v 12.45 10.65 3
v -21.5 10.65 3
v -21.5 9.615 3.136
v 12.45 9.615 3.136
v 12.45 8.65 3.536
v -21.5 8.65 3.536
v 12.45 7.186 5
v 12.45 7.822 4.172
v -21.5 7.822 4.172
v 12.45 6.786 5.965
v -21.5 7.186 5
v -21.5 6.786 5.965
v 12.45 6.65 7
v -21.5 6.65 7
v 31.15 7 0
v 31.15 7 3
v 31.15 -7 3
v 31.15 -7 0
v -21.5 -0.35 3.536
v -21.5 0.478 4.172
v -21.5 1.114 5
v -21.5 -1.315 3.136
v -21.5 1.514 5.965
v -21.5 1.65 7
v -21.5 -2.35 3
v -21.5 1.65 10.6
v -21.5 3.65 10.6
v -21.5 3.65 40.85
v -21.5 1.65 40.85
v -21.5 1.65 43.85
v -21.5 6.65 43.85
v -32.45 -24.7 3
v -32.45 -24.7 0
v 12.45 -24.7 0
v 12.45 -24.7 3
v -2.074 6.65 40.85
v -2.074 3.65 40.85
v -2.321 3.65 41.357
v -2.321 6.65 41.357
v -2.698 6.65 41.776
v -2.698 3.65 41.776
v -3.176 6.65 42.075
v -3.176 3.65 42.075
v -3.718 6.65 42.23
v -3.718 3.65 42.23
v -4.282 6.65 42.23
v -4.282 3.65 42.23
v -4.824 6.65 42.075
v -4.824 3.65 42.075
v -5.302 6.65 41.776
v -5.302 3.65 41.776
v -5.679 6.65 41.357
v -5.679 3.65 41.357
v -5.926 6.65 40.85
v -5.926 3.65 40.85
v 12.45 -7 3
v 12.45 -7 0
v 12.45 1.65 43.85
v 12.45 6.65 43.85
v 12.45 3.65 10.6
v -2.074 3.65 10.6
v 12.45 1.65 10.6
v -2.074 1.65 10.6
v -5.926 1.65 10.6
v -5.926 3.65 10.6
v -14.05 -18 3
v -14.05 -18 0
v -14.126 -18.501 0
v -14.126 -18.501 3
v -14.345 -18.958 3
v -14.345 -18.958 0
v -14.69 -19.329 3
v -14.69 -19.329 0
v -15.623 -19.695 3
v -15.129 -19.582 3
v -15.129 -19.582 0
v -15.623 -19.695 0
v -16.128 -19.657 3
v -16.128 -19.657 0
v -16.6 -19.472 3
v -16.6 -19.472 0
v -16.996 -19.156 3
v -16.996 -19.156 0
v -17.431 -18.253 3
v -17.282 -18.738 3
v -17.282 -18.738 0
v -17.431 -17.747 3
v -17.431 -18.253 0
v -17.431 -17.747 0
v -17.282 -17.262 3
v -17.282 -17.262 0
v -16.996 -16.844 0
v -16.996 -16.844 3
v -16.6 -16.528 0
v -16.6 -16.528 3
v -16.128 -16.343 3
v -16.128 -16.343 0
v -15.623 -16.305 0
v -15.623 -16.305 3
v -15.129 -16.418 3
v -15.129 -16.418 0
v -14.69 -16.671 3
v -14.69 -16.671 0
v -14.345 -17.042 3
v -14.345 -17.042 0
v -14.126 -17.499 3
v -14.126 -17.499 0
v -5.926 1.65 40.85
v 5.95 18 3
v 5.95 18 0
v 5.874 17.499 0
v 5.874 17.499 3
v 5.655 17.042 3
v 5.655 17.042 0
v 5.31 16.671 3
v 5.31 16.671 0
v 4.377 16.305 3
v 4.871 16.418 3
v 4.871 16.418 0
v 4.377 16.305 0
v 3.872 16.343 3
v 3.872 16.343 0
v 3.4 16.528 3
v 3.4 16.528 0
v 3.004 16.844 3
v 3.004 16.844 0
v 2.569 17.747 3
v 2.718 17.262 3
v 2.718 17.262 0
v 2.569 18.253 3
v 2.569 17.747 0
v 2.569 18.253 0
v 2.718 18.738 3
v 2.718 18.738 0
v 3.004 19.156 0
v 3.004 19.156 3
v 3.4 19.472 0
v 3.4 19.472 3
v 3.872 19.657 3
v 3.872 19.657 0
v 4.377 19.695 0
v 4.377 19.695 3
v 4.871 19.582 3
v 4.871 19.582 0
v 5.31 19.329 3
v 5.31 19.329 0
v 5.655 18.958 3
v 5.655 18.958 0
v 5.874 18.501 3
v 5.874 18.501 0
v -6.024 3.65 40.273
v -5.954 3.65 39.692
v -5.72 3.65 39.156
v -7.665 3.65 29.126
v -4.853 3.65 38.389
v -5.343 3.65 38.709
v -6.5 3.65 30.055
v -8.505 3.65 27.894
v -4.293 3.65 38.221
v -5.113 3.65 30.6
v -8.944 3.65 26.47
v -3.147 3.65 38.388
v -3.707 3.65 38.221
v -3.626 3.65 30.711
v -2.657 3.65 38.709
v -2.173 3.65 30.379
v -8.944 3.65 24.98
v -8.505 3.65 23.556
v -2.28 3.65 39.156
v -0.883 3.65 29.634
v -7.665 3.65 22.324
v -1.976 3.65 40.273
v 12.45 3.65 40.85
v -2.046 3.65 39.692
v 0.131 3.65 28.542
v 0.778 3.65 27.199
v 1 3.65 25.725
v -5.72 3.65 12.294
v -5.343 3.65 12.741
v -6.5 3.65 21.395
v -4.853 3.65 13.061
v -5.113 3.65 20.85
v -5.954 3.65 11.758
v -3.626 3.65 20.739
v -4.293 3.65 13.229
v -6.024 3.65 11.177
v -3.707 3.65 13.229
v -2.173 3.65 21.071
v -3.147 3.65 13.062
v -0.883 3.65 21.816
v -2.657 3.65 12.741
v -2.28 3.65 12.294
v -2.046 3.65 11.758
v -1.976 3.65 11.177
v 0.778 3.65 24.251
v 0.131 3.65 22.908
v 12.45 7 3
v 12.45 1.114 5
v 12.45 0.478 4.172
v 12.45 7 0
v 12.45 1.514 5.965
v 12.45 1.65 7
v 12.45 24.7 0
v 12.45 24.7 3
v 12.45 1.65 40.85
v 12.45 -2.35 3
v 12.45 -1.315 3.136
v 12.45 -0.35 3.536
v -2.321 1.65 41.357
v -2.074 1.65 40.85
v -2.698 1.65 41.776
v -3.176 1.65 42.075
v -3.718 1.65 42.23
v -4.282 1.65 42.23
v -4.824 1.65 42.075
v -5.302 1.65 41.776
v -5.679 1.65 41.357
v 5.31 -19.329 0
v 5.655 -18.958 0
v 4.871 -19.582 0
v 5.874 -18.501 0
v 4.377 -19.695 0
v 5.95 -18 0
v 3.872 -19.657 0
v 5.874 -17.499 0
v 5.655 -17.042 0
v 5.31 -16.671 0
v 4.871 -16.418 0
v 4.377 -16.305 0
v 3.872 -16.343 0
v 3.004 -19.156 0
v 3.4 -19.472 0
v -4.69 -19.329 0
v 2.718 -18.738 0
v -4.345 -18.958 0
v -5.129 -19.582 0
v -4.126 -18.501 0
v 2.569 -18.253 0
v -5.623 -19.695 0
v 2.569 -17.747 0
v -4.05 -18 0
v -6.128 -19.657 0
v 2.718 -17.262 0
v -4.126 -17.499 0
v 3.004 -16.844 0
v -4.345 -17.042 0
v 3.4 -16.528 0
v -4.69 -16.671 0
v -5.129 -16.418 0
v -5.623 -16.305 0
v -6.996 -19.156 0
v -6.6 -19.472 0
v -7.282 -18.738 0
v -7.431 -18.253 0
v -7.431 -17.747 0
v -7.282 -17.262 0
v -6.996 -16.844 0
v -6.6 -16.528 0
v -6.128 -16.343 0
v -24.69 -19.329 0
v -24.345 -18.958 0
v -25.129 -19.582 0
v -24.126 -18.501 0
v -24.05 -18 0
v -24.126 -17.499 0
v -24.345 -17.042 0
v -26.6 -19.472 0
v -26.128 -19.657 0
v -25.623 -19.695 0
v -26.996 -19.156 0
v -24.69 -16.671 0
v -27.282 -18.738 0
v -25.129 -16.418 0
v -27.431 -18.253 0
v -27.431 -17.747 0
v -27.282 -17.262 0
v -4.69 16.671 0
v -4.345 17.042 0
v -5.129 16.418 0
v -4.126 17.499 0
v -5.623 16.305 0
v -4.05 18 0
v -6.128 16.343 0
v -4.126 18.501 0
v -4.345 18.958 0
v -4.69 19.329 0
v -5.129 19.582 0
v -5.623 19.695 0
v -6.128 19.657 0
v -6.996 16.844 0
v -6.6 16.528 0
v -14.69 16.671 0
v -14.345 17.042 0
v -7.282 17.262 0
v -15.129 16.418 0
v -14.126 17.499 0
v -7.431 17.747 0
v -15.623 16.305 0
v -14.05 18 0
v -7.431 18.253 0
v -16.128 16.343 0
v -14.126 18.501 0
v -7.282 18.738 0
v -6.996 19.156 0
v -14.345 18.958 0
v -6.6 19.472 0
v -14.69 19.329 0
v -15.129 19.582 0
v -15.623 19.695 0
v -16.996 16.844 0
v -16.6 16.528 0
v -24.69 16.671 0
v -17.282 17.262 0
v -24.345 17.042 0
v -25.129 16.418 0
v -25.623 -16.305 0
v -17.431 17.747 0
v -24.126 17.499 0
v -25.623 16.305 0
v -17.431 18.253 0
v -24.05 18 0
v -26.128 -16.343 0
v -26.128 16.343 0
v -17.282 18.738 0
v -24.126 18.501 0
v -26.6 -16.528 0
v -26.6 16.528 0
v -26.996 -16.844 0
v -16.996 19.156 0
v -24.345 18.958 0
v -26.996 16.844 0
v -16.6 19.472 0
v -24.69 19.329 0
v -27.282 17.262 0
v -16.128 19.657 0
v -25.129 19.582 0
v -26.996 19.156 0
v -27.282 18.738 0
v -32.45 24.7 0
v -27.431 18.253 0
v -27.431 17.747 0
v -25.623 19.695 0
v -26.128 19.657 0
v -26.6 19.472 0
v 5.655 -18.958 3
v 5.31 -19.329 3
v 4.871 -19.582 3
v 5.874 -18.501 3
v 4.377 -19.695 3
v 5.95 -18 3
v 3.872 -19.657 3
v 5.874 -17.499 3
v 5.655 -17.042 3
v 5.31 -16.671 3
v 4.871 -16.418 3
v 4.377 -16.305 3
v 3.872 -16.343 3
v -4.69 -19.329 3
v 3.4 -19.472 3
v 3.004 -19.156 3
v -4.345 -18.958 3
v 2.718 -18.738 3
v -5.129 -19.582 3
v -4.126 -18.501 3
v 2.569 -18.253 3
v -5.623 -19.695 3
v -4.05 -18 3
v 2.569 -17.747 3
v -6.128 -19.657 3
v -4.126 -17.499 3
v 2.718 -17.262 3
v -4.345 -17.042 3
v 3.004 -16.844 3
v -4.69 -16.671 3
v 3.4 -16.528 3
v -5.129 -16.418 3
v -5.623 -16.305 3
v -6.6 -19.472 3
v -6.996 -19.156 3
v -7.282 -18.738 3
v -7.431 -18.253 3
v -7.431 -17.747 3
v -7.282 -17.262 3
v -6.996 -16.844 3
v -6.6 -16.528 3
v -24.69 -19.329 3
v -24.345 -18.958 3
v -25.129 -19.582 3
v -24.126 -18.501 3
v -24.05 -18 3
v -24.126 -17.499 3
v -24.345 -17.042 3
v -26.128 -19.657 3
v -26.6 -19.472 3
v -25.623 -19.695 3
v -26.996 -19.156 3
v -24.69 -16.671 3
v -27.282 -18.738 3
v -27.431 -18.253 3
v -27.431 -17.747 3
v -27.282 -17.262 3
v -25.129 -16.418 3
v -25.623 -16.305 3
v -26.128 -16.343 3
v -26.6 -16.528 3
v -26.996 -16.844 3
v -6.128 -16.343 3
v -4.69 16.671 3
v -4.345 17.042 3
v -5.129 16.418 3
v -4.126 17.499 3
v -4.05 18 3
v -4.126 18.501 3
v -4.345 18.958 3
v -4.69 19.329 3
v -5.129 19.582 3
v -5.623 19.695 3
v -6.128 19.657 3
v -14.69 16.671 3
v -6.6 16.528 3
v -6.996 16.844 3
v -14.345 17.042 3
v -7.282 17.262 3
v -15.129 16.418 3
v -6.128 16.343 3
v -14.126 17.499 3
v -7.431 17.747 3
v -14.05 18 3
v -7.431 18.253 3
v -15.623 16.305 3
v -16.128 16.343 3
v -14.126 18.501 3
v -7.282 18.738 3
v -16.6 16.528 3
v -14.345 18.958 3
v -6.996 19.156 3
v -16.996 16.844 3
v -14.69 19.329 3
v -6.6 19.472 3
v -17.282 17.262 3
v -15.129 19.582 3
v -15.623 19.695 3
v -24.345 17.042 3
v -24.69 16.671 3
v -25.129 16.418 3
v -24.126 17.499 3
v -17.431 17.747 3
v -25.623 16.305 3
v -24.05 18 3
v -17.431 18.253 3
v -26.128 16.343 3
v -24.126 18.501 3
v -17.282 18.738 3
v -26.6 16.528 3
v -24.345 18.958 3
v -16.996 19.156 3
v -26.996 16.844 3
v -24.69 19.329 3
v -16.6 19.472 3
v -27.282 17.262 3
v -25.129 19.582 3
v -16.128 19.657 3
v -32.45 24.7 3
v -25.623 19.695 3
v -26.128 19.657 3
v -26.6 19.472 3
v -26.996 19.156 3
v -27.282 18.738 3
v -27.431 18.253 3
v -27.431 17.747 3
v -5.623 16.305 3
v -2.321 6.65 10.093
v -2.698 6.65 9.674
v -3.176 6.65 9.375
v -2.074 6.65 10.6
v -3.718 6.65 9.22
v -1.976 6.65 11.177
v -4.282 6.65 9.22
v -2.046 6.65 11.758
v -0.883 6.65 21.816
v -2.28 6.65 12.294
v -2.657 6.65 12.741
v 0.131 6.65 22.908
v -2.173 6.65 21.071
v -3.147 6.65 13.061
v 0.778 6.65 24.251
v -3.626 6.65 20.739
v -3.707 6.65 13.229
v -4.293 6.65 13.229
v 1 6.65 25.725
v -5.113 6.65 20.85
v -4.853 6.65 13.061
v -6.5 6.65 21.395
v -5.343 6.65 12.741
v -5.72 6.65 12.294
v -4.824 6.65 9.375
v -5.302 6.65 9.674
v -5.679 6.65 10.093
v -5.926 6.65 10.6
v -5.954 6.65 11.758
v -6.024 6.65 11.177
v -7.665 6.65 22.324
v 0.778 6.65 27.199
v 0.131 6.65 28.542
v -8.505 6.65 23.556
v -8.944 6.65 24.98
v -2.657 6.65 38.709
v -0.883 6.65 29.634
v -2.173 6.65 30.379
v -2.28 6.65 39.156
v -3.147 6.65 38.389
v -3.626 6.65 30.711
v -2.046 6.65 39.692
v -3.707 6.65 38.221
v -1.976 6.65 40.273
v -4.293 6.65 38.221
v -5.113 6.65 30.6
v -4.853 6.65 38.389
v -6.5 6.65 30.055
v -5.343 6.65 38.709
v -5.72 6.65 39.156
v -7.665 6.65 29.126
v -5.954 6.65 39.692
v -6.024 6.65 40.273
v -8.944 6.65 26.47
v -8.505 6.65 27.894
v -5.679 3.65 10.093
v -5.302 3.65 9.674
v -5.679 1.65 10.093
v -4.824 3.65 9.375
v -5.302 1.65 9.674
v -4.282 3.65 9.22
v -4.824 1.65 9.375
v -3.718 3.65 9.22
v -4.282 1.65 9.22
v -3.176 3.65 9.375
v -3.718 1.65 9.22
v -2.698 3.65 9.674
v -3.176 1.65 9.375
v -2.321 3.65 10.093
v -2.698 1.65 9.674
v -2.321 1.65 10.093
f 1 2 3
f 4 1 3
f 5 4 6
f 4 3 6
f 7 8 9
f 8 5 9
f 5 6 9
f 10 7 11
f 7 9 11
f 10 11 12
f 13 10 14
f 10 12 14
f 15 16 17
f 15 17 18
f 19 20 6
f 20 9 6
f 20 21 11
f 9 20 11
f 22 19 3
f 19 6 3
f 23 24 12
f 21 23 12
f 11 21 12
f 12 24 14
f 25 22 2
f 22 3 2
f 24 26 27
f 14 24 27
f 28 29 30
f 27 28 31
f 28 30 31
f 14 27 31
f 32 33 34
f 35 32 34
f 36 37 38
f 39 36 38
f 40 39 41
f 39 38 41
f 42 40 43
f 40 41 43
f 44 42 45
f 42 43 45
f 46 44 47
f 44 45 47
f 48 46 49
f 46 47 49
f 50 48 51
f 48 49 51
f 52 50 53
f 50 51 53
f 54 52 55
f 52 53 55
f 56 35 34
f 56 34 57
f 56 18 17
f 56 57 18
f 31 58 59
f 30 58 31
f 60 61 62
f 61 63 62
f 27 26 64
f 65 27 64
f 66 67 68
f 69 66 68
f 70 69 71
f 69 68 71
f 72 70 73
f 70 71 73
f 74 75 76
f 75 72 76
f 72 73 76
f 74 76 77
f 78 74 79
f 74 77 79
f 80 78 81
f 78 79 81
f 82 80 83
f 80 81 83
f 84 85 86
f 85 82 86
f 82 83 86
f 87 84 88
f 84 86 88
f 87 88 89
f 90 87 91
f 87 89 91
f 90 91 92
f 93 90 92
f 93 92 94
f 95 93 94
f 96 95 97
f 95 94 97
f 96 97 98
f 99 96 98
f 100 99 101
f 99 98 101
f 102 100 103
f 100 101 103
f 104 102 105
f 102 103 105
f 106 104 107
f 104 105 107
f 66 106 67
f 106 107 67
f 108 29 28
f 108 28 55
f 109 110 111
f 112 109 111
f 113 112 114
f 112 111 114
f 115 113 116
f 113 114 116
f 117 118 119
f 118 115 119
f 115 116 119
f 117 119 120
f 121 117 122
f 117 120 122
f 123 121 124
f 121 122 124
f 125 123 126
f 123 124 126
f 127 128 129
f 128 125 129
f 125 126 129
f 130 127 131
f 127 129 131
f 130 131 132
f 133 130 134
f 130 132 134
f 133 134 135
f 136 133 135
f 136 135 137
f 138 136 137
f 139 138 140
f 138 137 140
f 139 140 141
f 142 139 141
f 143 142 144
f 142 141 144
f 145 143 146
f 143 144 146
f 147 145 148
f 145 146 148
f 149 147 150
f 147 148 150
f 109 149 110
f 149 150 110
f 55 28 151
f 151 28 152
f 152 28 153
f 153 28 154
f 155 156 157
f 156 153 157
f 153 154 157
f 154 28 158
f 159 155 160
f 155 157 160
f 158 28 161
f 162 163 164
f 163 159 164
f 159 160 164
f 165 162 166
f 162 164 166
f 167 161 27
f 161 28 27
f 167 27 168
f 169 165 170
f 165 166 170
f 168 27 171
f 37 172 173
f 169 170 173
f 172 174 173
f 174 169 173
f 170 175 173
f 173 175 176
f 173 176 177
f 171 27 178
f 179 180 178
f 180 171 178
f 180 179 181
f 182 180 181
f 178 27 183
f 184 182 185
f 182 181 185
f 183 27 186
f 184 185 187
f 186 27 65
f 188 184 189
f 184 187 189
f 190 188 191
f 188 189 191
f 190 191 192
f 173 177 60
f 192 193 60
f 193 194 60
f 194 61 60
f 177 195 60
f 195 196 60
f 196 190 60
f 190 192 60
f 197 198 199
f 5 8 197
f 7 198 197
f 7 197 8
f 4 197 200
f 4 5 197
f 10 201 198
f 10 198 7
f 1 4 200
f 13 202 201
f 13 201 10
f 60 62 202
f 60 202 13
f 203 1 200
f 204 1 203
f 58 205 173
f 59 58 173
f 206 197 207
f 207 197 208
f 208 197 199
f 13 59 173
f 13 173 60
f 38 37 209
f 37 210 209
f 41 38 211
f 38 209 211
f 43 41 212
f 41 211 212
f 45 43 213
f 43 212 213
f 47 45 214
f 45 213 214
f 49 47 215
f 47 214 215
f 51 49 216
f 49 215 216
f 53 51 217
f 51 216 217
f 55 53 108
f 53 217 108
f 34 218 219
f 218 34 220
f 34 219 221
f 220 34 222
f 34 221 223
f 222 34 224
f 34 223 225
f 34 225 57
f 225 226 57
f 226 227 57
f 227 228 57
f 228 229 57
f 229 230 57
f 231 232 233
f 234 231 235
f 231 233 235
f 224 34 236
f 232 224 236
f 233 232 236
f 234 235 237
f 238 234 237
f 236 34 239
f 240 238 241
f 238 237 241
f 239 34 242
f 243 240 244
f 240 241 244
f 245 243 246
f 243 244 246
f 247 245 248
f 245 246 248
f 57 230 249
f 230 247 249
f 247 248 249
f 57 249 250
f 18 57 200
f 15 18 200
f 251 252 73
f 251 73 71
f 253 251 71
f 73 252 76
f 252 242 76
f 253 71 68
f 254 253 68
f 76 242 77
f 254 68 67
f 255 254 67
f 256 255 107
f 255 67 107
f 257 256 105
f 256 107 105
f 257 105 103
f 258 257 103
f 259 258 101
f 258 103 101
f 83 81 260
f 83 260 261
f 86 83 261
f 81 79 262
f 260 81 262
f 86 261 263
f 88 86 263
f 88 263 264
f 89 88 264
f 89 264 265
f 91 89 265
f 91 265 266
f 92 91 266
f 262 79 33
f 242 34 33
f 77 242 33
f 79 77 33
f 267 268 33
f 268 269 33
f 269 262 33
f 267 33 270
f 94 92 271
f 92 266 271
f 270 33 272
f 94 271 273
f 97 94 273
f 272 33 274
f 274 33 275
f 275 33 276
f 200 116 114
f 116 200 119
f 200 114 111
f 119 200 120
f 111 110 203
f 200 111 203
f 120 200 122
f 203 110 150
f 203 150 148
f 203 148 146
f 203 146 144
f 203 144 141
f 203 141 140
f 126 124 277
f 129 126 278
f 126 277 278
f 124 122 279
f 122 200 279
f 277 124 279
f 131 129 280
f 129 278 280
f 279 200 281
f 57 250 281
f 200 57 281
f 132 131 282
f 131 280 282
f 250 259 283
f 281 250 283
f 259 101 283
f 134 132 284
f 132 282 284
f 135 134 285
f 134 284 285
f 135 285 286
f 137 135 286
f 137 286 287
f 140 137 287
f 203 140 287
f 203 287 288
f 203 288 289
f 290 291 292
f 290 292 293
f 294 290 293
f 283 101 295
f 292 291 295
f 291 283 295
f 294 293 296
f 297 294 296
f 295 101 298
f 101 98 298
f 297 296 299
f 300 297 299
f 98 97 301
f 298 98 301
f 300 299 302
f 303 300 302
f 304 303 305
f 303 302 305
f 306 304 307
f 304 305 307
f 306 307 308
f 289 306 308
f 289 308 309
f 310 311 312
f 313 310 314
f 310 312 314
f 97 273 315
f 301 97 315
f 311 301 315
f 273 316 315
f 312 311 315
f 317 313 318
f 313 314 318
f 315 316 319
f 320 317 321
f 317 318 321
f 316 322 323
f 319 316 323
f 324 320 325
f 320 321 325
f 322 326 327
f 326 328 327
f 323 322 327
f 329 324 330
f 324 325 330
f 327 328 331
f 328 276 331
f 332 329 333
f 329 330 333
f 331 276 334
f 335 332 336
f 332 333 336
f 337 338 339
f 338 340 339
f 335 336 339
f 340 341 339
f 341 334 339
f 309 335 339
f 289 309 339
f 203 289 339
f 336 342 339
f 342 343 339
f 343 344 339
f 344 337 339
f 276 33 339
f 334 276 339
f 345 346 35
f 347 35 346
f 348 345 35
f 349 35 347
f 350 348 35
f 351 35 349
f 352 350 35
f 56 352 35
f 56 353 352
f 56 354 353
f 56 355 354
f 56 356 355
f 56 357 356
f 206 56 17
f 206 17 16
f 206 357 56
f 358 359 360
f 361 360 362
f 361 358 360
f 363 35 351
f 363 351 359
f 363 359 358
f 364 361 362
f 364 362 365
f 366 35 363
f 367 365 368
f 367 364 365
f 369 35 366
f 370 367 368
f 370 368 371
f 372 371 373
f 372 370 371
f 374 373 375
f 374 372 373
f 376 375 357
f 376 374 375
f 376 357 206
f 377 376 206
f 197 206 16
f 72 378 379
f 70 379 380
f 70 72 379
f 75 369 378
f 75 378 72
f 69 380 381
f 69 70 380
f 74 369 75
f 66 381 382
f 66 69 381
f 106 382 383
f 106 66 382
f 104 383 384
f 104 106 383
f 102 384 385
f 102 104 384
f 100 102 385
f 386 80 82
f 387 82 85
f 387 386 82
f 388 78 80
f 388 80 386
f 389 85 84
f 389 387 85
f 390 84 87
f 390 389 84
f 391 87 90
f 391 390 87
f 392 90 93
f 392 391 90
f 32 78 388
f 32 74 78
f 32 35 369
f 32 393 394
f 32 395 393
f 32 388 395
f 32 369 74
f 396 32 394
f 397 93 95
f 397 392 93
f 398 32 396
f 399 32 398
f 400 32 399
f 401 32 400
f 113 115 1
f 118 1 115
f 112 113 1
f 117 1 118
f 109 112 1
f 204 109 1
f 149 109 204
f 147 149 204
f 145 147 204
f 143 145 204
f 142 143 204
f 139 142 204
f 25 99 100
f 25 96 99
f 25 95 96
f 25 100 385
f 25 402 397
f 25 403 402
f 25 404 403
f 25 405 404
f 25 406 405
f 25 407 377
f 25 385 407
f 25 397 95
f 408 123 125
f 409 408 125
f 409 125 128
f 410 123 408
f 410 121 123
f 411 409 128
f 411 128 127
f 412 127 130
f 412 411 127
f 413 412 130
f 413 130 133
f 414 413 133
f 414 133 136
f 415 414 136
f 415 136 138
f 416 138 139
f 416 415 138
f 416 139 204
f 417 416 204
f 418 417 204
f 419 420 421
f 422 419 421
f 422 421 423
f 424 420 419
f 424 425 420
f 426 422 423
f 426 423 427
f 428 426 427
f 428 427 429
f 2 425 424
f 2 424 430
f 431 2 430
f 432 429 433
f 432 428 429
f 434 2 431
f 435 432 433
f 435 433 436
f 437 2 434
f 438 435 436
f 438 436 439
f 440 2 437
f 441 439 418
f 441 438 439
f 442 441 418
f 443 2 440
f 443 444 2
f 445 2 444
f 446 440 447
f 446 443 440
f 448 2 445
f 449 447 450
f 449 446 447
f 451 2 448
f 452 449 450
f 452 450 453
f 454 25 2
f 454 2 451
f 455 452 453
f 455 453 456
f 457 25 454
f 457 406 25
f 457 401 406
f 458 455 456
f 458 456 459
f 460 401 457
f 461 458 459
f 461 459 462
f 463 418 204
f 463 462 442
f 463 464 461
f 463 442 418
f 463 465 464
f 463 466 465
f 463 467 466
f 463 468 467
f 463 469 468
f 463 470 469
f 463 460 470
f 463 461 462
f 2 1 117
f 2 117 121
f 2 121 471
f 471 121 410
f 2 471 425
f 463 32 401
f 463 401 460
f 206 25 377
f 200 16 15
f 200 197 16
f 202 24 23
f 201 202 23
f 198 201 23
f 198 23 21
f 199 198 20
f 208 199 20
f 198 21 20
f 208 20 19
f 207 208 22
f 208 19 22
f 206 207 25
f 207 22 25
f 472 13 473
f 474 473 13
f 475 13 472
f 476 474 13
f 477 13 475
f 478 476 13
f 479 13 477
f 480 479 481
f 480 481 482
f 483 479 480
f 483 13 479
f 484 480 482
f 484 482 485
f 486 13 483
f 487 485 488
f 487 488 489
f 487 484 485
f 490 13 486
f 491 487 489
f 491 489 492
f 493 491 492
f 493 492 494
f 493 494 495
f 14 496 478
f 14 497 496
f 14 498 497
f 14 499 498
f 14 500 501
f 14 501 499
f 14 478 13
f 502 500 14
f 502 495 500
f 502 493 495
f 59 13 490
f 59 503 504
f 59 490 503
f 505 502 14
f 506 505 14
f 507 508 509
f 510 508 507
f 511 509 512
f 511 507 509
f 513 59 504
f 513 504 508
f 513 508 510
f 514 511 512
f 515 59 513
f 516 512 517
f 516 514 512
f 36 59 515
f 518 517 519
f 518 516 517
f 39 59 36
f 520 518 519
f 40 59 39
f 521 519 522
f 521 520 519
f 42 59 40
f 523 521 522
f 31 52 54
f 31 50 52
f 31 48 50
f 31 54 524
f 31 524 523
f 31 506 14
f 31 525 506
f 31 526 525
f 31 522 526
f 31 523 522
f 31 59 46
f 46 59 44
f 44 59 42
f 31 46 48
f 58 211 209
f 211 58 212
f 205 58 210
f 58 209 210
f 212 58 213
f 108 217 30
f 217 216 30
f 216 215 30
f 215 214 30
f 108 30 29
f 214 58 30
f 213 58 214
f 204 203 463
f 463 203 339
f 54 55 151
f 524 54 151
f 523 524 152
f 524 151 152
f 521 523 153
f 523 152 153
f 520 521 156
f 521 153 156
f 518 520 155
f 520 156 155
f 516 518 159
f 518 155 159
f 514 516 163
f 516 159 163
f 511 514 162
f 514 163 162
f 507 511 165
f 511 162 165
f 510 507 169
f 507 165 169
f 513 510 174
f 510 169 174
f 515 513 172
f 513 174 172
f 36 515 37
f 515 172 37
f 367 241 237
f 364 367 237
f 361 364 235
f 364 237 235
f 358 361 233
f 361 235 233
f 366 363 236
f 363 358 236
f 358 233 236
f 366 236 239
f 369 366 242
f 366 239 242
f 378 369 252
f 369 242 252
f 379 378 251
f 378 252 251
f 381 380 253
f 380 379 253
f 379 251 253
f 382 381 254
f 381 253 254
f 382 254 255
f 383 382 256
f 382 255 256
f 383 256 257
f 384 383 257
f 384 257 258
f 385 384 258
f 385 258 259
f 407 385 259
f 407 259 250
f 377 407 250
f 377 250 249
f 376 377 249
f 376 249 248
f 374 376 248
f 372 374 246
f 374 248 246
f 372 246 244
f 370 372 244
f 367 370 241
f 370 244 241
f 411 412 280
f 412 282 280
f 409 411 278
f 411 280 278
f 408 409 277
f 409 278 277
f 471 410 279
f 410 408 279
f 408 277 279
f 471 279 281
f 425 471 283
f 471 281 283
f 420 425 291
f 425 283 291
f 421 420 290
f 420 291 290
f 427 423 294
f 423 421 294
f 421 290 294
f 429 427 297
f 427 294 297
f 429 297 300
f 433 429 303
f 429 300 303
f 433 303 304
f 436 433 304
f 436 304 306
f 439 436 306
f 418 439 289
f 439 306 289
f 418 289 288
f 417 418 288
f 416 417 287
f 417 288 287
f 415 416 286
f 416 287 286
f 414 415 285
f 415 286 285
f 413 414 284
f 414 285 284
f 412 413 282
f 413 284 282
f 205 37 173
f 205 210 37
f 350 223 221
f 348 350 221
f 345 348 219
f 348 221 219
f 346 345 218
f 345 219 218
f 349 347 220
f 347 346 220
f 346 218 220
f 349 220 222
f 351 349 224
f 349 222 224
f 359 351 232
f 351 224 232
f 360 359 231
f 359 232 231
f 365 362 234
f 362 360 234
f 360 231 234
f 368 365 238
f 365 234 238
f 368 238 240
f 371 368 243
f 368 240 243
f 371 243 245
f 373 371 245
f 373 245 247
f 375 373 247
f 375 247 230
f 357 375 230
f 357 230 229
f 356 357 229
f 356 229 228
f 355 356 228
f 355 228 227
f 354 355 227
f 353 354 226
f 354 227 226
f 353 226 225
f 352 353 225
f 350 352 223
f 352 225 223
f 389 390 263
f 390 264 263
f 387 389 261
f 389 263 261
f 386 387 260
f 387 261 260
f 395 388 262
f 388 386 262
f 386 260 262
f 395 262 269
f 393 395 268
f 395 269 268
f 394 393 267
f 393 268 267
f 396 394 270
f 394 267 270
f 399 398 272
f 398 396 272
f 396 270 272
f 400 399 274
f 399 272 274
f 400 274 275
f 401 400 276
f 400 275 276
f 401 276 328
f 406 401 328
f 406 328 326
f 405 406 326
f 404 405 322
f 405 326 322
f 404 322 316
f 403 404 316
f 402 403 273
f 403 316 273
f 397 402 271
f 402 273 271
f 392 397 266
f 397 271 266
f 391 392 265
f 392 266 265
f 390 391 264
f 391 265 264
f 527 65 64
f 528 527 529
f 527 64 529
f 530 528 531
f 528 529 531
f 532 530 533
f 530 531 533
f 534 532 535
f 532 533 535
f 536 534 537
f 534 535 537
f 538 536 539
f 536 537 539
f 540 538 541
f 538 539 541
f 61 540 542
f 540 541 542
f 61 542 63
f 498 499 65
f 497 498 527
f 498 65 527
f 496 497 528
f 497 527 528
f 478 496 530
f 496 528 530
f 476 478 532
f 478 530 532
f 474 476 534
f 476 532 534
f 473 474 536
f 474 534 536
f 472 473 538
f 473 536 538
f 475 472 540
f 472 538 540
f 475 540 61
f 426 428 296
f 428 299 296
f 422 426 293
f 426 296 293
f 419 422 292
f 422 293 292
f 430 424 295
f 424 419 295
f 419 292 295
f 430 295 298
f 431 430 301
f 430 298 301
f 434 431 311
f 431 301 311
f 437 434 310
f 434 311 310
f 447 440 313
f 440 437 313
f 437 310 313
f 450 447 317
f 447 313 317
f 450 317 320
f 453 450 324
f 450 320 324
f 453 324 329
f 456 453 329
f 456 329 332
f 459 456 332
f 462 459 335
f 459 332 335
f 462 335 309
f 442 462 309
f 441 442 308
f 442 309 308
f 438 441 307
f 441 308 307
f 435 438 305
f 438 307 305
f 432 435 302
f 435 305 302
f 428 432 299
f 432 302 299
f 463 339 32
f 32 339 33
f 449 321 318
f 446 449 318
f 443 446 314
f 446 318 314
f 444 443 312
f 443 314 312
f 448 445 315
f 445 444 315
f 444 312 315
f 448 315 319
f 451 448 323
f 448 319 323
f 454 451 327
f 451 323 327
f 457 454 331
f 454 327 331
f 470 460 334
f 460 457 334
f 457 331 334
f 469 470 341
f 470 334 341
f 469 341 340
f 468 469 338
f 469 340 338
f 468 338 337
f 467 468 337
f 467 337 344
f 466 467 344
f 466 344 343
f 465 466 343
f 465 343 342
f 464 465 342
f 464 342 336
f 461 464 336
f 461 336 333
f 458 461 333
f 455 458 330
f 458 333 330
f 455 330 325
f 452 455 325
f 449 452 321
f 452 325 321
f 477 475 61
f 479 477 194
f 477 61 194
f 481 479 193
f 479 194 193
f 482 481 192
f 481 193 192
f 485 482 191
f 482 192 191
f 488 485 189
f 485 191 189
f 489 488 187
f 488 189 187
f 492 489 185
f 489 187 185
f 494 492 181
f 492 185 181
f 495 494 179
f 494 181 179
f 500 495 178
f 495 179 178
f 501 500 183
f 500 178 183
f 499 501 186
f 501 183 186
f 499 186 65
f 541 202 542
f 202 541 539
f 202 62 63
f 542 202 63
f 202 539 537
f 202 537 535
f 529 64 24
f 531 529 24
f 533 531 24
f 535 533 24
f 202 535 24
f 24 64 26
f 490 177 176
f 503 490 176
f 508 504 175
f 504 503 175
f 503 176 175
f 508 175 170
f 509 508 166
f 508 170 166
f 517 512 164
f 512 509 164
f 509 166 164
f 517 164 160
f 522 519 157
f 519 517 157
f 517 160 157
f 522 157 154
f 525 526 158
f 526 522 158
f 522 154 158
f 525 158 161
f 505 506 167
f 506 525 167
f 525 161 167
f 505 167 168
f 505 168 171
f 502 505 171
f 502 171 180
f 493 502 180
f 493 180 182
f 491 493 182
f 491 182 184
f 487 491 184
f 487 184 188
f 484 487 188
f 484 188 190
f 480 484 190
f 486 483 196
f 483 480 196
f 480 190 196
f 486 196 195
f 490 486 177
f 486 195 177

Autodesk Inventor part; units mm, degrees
ref_plane "YZ Plane" through (0, 0, 0) normal (1, 0, 0) x (0, 1, 0)
ref_plane "XZ Plane" through (0, 0, 0) normal (0, 1, 0) x (-1, 0, 0)
ref_plane "Work Plane1" through (0, 0, 0) normal (0, 0, 1) x (1, 0, 0)
sketch "Sketch1" plane through (0, 0, 0) normal (0, 0, 1) x (1, 0, 0)
  circle A0 centre (-25.75, 18) radius 1.7 projected
  circle A1 centre (4.25, 18) radius 1.7 projected
  circle A2 centre (-15.75, 18) radius 1.7 projected
  circle A3 centre (-5.75, 18) radius 1.7 projected
  line L0 (-32.45, 24.7) -> (12.45, 24.7) construction
  line L1 (-32.45, 13) -> (-32.45, 24.7) construction
  line L2 (-12.45, 13) -> (-32.45, 13) construction
  line L3 (1.25, 8.4548) -> (-12.45, 13) construction
  arc A4 (5.4986, 7.8696) -> (1.25, 8.4548) centre (2.25, 0) ccw construction
  line L4 (12.45, 5) -> (5.4986, 7.8696) construction
  line L5 (12.45, 24.7) -> (12.45, 7) construction
  circle A5 centre (-25.75, -18) radius 1.7 projected
  circle A6 centre (-15.75, -18) radius 1.7 projected
  circle A7 centre (4.25, -18) radius 1.7 projected
  line L6 (12.45, -24.7) -> (-32.45, -24.7) construction
  line L7 (12.45, -7) -> (12.45, -24.7) construction
  line L8 (5.4986, -7.8696) -> (12.45, -5) construction
  arc A8 (1.25, -8.4548) -> (5.4986, -7.8696) centre (2.25, 0) ccw construction
  line L9 (-12.45, -13) -> (1.25, -8.4548) construction
  line L10 (-12.45, -13) -> (-32.45, -13) construction
  line L11 (-32.45, -24.7) -> (-32.45, -13) construction
  circle A9 centre (-5.75, -18) radius 1.7 projected
  line L12 (12.45, 24.7) -> (-32.45, 24.7)
  line L13 (-32.45, 24.7) -> (-32.45, -24.7)
  line L14 (-32.45, -24.7) -> (12.45, -24.7)
  line L15 (12.45, -24.7) -> (12.45, 24.7)
  line L16 (12.45, 5) -> (31.15, 5) projected
  line L17 (31.15, 5) -> (31.15, 7) projected
  line L18 (12.45, 7) -> (31.15, 7) projected
  line L19 (12.45, -7) -> (31.15, -7) projected
  line L20 (31.15, -7) -> (31.15, -5) projected
  line L21 (12.45, -5) -> (31.15, -5) projected
  point P0 (0, 0)
extrude "Extrusion1" add sketch "Sketch1" along normal blind 3 contours L15 L14 L13 L12
ref_plane "Work Plane2" through (-6.9588, 1.65, 41.55) normal (0, 1, 0) x (0, 0, -1)
ref_plane "Work Plane3" through (12.46, 3.65, 25.725) normal (0, 1, 0) x (0, 0, -1)
sketch "Sketch2" plane through (-6.9588, 1.65, 41.55) normal (0, 1, 0) x (0, 0, -1)
  arc A0 (29.75, -19.4088) -> (30.75, -18.4088) centre (29.75, -18.4088) ccw construction
  line L0 (30.75, -18.4088) -> (30.75, -6.9173) construction
  arc A1 (30.75, -6.9173) -> (29.8938, -5.9277) centre (29.75, -6.9173) ccw construction
  arc A2 (29.8938, 0.01) -> (29.8938, -5.9277) centre (30.325, -2.9588) ccw construction
  arc A3 (29.8938, 0.01) -> (30.75, 0.9996) centre (29.75, 0.9996) ccw construction
  line L1 (30.75, 0.9996) -> (30.75, 13.5412) construction
  arc A4 (30.75, 13.5412) -> (29.75, 14.5412) centre (29.75, 13.5412) ccw construction
  line L2 (1.9, 14.5412) -> (29.75, 14.5412) construction
  arc A5 (1.9, 14.5412) -> (0.9, 13.5412) centre (1.9, 13.5412) ccw construction
  line L3 (0.9, 13.5412) -> (0.9, 0.9996) construction
  arc A6 (0.9, 0.9996) -> (1.7563, 0.01) centre (1.9, 0.9996) ccw construction
  arc A7 (1.7563, -5.9277) -> (1.7563, 0.01) centre (1.325, -2.9588) ccw construction
  arc A8 (1.7563, -5.9277) -> (0.9, -6.9173) centre (1.9, -6.9173) ccw construction
  line L4 (0.9, -6.9173) -> (0.9, -18.4088) construction
  arc A9 (0.9, -18.4088) -> (1.9, -19.4088) centre (1.9, -18.4088) ccw construction
  line L5 (29.75, -19.4088) -> (1.9, -19.4088) construction
  line L6 (27.025, -11.9588) -> (27.025, -5.2194) construction
  line L7 (4.625, -11.9588) -> (27.025, -11.9588) construction
  line L8 (4.625, -5.2194) -> (4.625, -11.9588) construction
  arc A10 (4.625, -5.2194) -> (4.625, -0.6983) centre (1.325, -2.9588) ccw construction
  line L9 (4.625, -0.6983) -> (4.625, 11.8412) construction
  line L10 (27.025, 11.8412) -> (4.625, 11.8412) construction
  line L11 (27.025, 11.8412) -> (27.025, -0.6983) construction
  arc A11 (27.025, -0.6983) -> (27.025, -5.2194) centre (30.325, -2.9588) ccw construction
  arc A12 (33.55, -6.9286) -> (32.55, -5.9286) centre (32.55, -6.9286) ccw construction
  line L12 (32.55, -5.9286) -> (30.75, -5.9286) construction
  arc A13 (29.8938, -5.9277) -> (30.75, -5.9286) centre (30.325, -2.9588) ccw construction
  arc A14 (30.75, -6.9173) -> (29.8938, -5.9277) centre (29.75, -6.9173) ccw construction
  line L13 (30.75, -18.4088) -> (30.75, -6.9173) construction
  arc A15 (29.75, -19.4088) -> (30.75, -18.4088) centre (29.75, -18.4088) ccw construction
  line L14 (32.55, -19.4088) -> (29.75, -19.4088) construction
  arc A16 (32.55, -19.4088) -> (33.55, -18.4088) centre (32.55, -18.4088) ccw construction
  line L15 (33.55, -6.9286) -> (33.55, -18.4088) construction
  arc A17 (32.55, 0.0109) -> (33.55, 1.0109) centre (32.55, 1.0109) ccw construction
  line L16 (33.55, 13.5412) -> (33.55, 1.0109) construction
  arc A18 (33.55, 13.5412) -> (32.55, 14.5412) centre (32.55, 13.5412) ccw construction
  line L17 (29.75, 14.5412) -> (32.55, 14.5412) construction
  arc A19 (30.75, 13.5412) -> (29.75, 14.5412) centre (29.75, 13.5412) ccw construction
  line L18 (30.75, 0.9996) -> (30.75, 13.5412) construction
  arc A20 (29.8938, 0.01) -> (30.75, 0.9996) centre (29.75, 0.9996) ccw construction
  arc A21 (30.75, 0.0109) -> (29.8938, 0.01) centre (30.325, -2.9588) ccw construction
  line L19 (30.75, 0.0109) -> (32.55, 0.0109) construction
  arc A22 (-1.9, 1.0109) -> (-0.9, 0.0109) centre (-0.9, 1.0109) ccw construction
  line L20 (-0.9, 0.0109) -> (0.9, 0.0109) construction
  arc A23 (1.7563, 0.01) -> (0.9, 0.0109) centre (1.325, -2.9588) ccw construction
  arc A24 (0.9, 0.9996) -> (1.7563, 0.01) centre (1.9, 0.9996) ccw construction
  line L21 (0.9, 13.5412) -> (0.9, 0.9996) construction
  arc A25 (1.9, 14.5412) -> (0.9, 13.5412) centre (1.9, 13.5412) ccw construction
  line L22 (-0.9, 14.5412) -> (1.9, 14.5412) construction
  arc A26 (-0.9, 14.5412) -> (-1.9, 13.5412) centre (-0.9, 13.5412) ccw construction
  line L23 (-1.9, 1.0109) -> (-1.9, 13.5412) construction
  arc A27 (-0.9, -5.9286) -> (-1.9, -6.9286) centre (-0.9, -6.9286) ccw construction
  line L24 (-1.9, -18.4088) -> (-1.9, -6.9286) construction
  arc A28 (-1.9, -18.4088) -> (-0.9, -19.4088) centre (-0.9, -18.4088) ccw construction
  line L25 (1.9, -19.4088) -> (-0.9, -19.4088) construction
  arc A29 (0.9, -18.4088) -> (1.9, -19.4088) centre (1.9, -18.4088) ccw construction
  line L26 (0.9, -6.9173) -> (0.9, -18.4088) construction
  arc A30 (1.7563, -5.9277) -> (0.9, -6.9173) centre (1.9, -6.9173) ccw construction
  arc A31 (0.9, -5.9286) -> (1.7563, -5.9277) centre (1.325, -2.9588) ccw construction
  line L27 (0.9, -5.9286) -> (-0.9, -5.9286) construction
  line L28 (-1.9, -6.9286) -> (-1.9, 1.0109) construction
  arc A32 (-0.9, -5.9286) -> (-1.9, -6.9286) centre (-0.9, -6.9286) ccw construction
  line L29 (0.9, -5.9286) -> (-0.9, -5.9286) construction
  arc A33 (0.9, -5.9286) -> (0.9, 0.0109) centre (1.325, -2.9588) ccw construction
  line L30 (-0.9, 0.0109) -> (0.9, 0.0109) construction
  arc A34 (-1.9, 1.0109) -> (-0.9, 0.0109) centre (-0.9, 1.0109) ccw construction
  circle A35 centre (1.325, -2.9588) radius 1.725 construction
  line L31 (33.55, 1.0109) -> (33.55, -6.9286) construction
  arc A36 (32.55, 0.0109) -> (33.55, 1.0109) centre (32.55, 1.0109) ccw construction
  line L32 (30.75, 0.0109) -> (32.55, 0.0109) construction
  arc A37 (30.75, 0.0109) -> (30.75, -5.9286) centre (30.325, -2.9588) ccw construction
  line L33 (32.55, -5.9286) -> (30.75, -5.9286) construction
  arc A38 (33.55, -6.9286) -> (32.55, -5.9286) centre (32.55, -6.9286) ccw construction
  circle A39 centre (30.325, -2.9588) radius 1.725 construction
  line L34 (-2.3, 14.5412) -> (0.7, 14.5412)
  line L35 (0.7, -19.4088) -> (-2.3, -19.4088)
  line L36 (-2.3, -19.4088) -> (-2.3, 14.5412)
  line L37 (15.825, 14.5412) -> (15.825, -19.4088) construction
  circle A40 centre (1.325, -2.9588) radius 2.025
  line L38 (0.7, 14.5412) -> (0.7, -1.0327)
  line L39 (0.7, -4.885) -> (0.7, -19.4088)
  arc A41 (30.75, 13.5412) -> (29.75, 14.5412) centre (29.75, 13.5412) ccw construction
  line L40 (30.75, 13.5412) -> (30.75, 0.9996) construction
  arc A42 (29.8938, 0.01) -> (30.75, 0.9996) centre (29.75, 0.9996) ccw construction
  arc A43 (29.8938, 0.01) -> (29.8938, -5.9277) centre (30.325, -2.9588) ccw construction
  arc A44 (30.75, -6.9173) -> (29.8938, -5.9277) centre (29.75, -6.9173) ccw construction
  line L41 (30.75, -6.9173) -> (30.75, -18.4088) construction
  arc A45 (29.75, -19.4088) -> (30.75, -18.4088) centre (29.75, -18.4088) ccw construction
  line L42 (27.025, -5.2194) -> (27.025, -11.9588) construction
  arc A46 (27.025, -0.6983) -> (27.025, -5.2194) centre (30.325, -2.9588) ccw construction
  line L43 (27.025, -0.6983) -> (27.025, 11.8412) construction
  arc A47 (32.55, 0.0109) -> (33.55, 1.0109) centre (32.55, 1.0109) ccw construction
  line L44 (32.55, 0.0109) -> (30.75, 0.0109) construction
  arc A48 (30.75, 0.0109) -> (29.8938, 0.01) centre (30.325, -2.9588) ccw construction
  arc A49 (29.8938, 0.01) -> (30.75, 0.9996) centre (29.75, 0.9996) ccw construction
  line L45 (30.75, 13.5412) -> (30.75, 0.9996) construction
  arc A50 (30.75, 13.5412) -> (29.75, 14.5412) centre (29.75, 13.5412) ccw construction
  line L46 (32.55, 14.5412) -> (29.75, 14.5412) construction
  arc A51 (33.55, 13.5412) -> (32.55, 14.5412) centre (32.55, 13.5412) ccw construction
  line L47 (33.55, 1.0109) -> (33.55, 13.5412) construction
  arc A52 (33.55, -6.9286) -> (32.55, -5.9286) centre (32.55, -6.9286) ccw construction
  line L48 (33.55, -18.4088) -> (33.55, -6.9286) construction
  arc A53 (32.55, -19.4088) -> (33.55, -18.4088) centre (32.55, -18.4088) ccw construction
  line L49 (29.75, -19.4088) -> (32.55, -19.4088) construction
  arc A54 (29.75, -19.4088) -> (30.75, -18.4088) centre (29.75, -18.4088) ccw construction
  line L50 (30.75, -6.9173) -> (30.75, -18.4088) construction
  arc A55 (30.75, -6.9173) -> (29.8938, -5.9277) centre (29.75, -6.9173) ccw construction
  arc A56 (29.8938, -5.9277) -> (30.75, -5.9286) centre (30.325, -2.9588) ccw construction
  line L51 (30.75, -5.9286) -> (32.55, -5.9286) construction
  line L52 (33.55, -6.9286) -> (33.55, 1.0109) construction
  arc A57 (33.55, -6.9286) -> (32.55, -5.9286) centre (32.55, -6.9286) ccw construction
  line L53 (30.75, -5.9286) -> (32.55, -5.9286) construction
  arc A58 (30.75, 0.0109) -> (30.75, -5.9286) centre (30.325, -2.9588) ccw construction
  line L54 (32.55, 0.0109) -> (30.75, 0.0109) construction
  arc A59 (32.55, 0.0109) -> (33.55, 1.0109) centre (32.55, 1.0109) ccw construction
  circle A60 centre (30.325, -2.9588) radius 1.725 construction
  line L55 (33.95, 14.5412) -> (30.95, 14.5412)
  line L56 (30.95, -19.4088) -> (33.95, -19.4088)
  line L57 (33.95, -19.4088) -> (33.95, 14.5412)
  circle A61 centre (30.325, -2.9588) radius 2.025
  line L58 (30.95, 14.5412) -> (30.95, -1.0327)
  line L59 (30.95, -4.885) -> (30.95, -19.4088)
extrude "Extrusion2" add sketch "Sketch2" along normal up to surface (2 mm away) contours L34 L38 A40 L39 L35 L36 | L57 L56 L59 A61 L58 L55
sketch "Sketch3" plane through (-21.5, 3.65, 43.85) normal (0, 1, 0) x (1, 0, 0)
  line L0 (33.95, 0) -> (0, 0) projected
  line L1 (33.95, 36.25) -> (33.95, 33.25) projected
  line L2 (0, 0) -> (33.95, 0)
  line L3 (33.95, 0) -> (33.95, 36.25)
  line L4 (33.95, 36.25) -> (0, 36.25)
  line L5 (0, 36.25) -> (0, 0)
  arc A0 (15.5739, 3) -> (19.4261, 3) centre (17.5, 3.625) ccw projected
  arc A1 (19.4261, 33.25) -> (15.5739, 33.25) centre (17.5, 32.625) ccw projected
  circle A2 centre (17.5, 3.625) radius 2.025
  circle A3 centre (17.5, 32.625) radius 2.025
  circle A4 centre (17.5, 18.125) radius 5
  point P0 (21.5, 43.85)
  point P1 (33.95, 0)
  point P2 (33.95, 33.25)
  point P3 (19.4261, 33.25)
  point P4 (19.4261, 3)
  point P5 (0, 18.125)
  dimension "d15" = 10
extrude "Extrusion3" add sketch "Sketch3" along normal blind 3
sketch "Sketch4" plane through (12.45, 1.65, 7.6) normal (0, 0, -1) x (-1, 0, 0)
  line L0 (0, 0) -> (0, 5) projected
  line L1 (0, 0) -> (33.95, 0) projected
  line L2 (33.95, 0) -> (33.95, 5) projected
  line L3 (0, 5) -> (33.95, 5) projected
  point P0 (12.45, -1.65)
extrude "Extrusion4" add sketch "Sketch4" along normal up to surface (4.6 mm away)
fillet "Fillet1" radius 4 2 edges at (-4.525, 1.65, 3) (-4.525, 6.65, 3)
sketch "Sketch5" plane through (12.45, -24.7, 0) normal (1, 0, 0) x (0, 0, -1)
  line L0 (0.1, 19.7) -> (8.2, 19.7) projected
  line L1 (0.1, 17.7) -> (0.1, 19.7) projected
  line L2 (10.2, 17.7) -> (0.1, 17.7) projected
  line L3 (10.2, 31.7) -> (10.2, 17.7) projected
  line L4 (0.1, 31.7) -> (10.2, 31.7) projected
  line L5 (0.1, 29.7) -> (0.1, 31.7) projected
  line L6 (8.2, 29.7) -> (0.1, 29.7) projected
  line L7 (8.2, 19.7) -> (8.2, 29.7) projected
  line L8 (-43.85, 26.35) -> (-43.85, 31.35) projected
  line L9 (-43.85, 26.35) -> (-40.85, 26.35) projected
  line L10 (-40.85, 26.35) -> (-40.85, 28.35) projected
  line L11 (-40.85, 28.35) -> (-10.6, 28.35) projected
  line L12 (-10.6, 26.35) -> (-10.6, 28.35) projected
  line L13 (-10.6, 26.35) -> (-7, 26.35) projected
  arc A0 (-3, 22.35) -> (-7, 26.35) centre (-7, 22.35) ccw projected
  line L14 (-3, 0) -> (-3, 22.35) projected
  line L15 (0, 0) -> (-3, 0) projected
  line L16 (0, 0) -> (0, 49.4) projected
  line L17 (0, 49.4) -> (-3, 49.4) projected
  line L18 (-3, 35.35) -> (-3, 49.4) projected
  arc A1 (-7, 31.35) -> (-3, 35.35) centre (-7, 35.35) ccw projected
  line L19 (-43.85, 31.35) -> (-7, 31.35) projected
  line L20 (-3, 22.35) -> (-3, 35.35) projected
  line L21 (-3, 31.7) -> (0, 31.7)
  line L22 (0, 31.7) -> (0, 17.7)
  line L23 (0, 17.7) -> (-3, 17.7)
  line L24 (-3, 17.7) -> (-3, 31.7)
  line L25 (0, 0) -> (0, 49.4) projected
  point P0 (0, 24.7)
  point P1 (0, 31.7)
ref_plane "Work Plane4" through (31.15, -26.2379, 8.1621) normal (1, 0, 0) x (0, 0.9775164, 0.2108593)
extrude "Extrusion5" add sketch "Sketch5" along normal up to surface (18.7 mm away) contours L21 L16 L23 L14 L20
properties part number "body cover"
